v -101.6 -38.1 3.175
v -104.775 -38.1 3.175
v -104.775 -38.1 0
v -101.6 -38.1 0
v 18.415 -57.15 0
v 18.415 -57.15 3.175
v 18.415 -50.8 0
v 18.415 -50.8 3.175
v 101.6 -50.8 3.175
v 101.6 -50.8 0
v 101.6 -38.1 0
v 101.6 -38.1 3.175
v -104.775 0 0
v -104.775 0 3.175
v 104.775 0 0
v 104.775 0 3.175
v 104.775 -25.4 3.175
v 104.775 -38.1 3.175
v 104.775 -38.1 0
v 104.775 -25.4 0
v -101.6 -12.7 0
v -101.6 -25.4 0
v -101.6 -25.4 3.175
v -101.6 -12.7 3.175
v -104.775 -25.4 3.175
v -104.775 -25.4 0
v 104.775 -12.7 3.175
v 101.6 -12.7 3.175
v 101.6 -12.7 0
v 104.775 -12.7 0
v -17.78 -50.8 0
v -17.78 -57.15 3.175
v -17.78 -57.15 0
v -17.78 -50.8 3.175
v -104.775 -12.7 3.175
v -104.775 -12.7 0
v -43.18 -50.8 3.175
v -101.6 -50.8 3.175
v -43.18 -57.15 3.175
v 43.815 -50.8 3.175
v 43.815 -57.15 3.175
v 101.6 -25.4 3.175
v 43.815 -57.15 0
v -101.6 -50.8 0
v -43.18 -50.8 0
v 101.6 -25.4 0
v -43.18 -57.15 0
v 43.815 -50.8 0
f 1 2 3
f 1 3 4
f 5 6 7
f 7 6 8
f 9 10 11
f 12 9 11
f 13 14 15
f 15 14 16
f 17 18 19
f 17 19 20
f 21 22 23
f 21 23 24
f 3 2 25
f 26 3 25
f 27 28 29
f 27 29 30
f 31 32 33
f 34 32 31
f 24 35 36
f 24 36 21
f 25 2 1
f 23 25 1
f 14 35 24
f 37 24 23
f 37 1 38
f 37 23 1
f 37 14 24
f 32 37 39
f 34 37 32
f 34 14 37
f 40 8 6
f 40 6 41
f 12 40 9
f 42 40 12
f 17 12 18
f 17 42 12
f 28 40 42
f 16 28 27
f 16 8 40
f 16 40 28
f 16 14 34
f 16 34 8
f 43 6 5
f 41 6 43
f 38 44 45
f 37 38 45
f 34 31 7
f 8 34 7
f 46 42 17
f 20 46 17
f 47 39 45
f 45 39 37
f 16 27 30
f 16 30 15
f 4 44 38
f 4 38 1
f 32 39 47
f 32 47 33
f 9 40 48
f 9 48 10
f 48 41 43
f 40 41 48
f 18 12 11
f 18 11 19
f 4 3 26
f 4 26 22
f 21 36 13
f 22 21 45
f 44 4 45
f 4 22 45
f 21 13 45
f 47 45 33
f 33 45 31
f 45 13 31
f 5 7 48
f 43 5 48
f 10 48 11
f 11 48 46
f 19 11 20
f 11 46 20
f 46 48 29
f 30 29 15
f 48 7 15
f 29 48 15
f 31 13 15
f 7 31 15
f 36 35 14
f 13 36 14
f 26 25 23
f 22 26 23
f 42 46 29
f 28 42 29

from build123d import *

# Parameters (mm, degrees)
SKETCH1_W           = 203.2
SKETCH1_H           = 101.6
BOSS_EXTRUDE1_DEPTH = 3.175
SKETCH2_W           = 3.175
SKETCH2_H           = 12.7
SKETCH2_W_2         = 25.4
SKETCH2_H_2         = 6.35
BOSS_EXTRUDE2_DEPTH = 3.175
SKETCH3_W           = 25.4
SKETCH3_H           = 6.35
CUT_EXTRUDE1_DEPTH  = 120.947785411
SKETCH4_W           = 245.475029748
SKETCH4_H           = 66.468196642
CUT_EXTRUDE2_DEPTH  = 120.390132549


with BuildPart() as part:
    # Sketch1 → Boss-Extrude1 (new body)
    with BuildSketch(Plane.XY):
        Rectangle(SKETCH1_W, SKETCH1_H)
    extrude(amount=BOSS_EXTRUDE1_DEPTH)

    # Sketch2 → Boss-Extrude2 (add)
    with BuildSketch(Plane.XY.offset(3.175)):
        with Locations((-103.1875, 19.05)):
            Rectangle(SKETCH2_W, SKETCH2_H)
        with Locations((-103.1875, 44.45)):
            Rectangle(SKETCH2_W, SKETCH2_H)
        with Locations((-103.1875, -6.35)):
            Rectangle(SKETCH2_W, SKETCH2_H)
        with Locations((-103.1875, -31.75)):
            Rectangle(SKETCH2_W, SKETCH2_H)
        with Locations((-92.075, -53.975)):
            Rectangle(SKETCH2_W_2, SKETCH2_H_2)
        with Locations((-30.48, -53.975)):
            Rectangle(SKETCH2_W_2, SKETCH2_H_2)
        with Locations((31.115, -53.975)):
            Rectangle(SKETCH2_W_2, SKETCH2_H_2)
        with Locations((92.71, -53.975)):
            Rectangle(SKETCH2_W_2, SKETCH2_H_2)
        with Locations((103.1875, -31.75)):
            Rectangle(SKETCH2_W, SKETCH2_H)
        with Locations((103.1875, -6.35)):
            Rectangle(SKETCH2_W, SKETCH2_H)
        with Locations((103.1875, 19.05)):
            Rectangle(SKETCH2_W, SKETCH2_H)
        with Locations((103.1875, 44.45)):
            Rectangle(SKETCH2_W, SKETCH2_H)
    extrude(amount=-BOSS_EXTRUDE2_DEPTH)

    # Sketch3 → Cut-Extrude1 (cut, through all)
    with BuildSketch(Plane.XY.offset(3.175)):
        with Locations((-92.075, -53.975)):
            Rectangle(SKETCH3_W, SKETCH3_H)
        with Locations((92.71, -53.975)):
            Rectangle(SKETCH3_W, SKETCH3_H)
    extrude(amount=-CUT_EXTRUDE1_DEPTH, mode=Mode.SUBTRACT)

    # Sketch4 → Cut-Extrude2 (cut, through all)
    with BuildSketch(Plane.XY.offset(3.175)):
        with Locations((-8.102055055, 33.234098321)):
            Rectangle(SKETCH4_W, SKETCH4_H)
    extrude(amount=-CUT_EXTRUDE2_DEPTH, mode=Mode.SUBTRACT)


solid = part.part
